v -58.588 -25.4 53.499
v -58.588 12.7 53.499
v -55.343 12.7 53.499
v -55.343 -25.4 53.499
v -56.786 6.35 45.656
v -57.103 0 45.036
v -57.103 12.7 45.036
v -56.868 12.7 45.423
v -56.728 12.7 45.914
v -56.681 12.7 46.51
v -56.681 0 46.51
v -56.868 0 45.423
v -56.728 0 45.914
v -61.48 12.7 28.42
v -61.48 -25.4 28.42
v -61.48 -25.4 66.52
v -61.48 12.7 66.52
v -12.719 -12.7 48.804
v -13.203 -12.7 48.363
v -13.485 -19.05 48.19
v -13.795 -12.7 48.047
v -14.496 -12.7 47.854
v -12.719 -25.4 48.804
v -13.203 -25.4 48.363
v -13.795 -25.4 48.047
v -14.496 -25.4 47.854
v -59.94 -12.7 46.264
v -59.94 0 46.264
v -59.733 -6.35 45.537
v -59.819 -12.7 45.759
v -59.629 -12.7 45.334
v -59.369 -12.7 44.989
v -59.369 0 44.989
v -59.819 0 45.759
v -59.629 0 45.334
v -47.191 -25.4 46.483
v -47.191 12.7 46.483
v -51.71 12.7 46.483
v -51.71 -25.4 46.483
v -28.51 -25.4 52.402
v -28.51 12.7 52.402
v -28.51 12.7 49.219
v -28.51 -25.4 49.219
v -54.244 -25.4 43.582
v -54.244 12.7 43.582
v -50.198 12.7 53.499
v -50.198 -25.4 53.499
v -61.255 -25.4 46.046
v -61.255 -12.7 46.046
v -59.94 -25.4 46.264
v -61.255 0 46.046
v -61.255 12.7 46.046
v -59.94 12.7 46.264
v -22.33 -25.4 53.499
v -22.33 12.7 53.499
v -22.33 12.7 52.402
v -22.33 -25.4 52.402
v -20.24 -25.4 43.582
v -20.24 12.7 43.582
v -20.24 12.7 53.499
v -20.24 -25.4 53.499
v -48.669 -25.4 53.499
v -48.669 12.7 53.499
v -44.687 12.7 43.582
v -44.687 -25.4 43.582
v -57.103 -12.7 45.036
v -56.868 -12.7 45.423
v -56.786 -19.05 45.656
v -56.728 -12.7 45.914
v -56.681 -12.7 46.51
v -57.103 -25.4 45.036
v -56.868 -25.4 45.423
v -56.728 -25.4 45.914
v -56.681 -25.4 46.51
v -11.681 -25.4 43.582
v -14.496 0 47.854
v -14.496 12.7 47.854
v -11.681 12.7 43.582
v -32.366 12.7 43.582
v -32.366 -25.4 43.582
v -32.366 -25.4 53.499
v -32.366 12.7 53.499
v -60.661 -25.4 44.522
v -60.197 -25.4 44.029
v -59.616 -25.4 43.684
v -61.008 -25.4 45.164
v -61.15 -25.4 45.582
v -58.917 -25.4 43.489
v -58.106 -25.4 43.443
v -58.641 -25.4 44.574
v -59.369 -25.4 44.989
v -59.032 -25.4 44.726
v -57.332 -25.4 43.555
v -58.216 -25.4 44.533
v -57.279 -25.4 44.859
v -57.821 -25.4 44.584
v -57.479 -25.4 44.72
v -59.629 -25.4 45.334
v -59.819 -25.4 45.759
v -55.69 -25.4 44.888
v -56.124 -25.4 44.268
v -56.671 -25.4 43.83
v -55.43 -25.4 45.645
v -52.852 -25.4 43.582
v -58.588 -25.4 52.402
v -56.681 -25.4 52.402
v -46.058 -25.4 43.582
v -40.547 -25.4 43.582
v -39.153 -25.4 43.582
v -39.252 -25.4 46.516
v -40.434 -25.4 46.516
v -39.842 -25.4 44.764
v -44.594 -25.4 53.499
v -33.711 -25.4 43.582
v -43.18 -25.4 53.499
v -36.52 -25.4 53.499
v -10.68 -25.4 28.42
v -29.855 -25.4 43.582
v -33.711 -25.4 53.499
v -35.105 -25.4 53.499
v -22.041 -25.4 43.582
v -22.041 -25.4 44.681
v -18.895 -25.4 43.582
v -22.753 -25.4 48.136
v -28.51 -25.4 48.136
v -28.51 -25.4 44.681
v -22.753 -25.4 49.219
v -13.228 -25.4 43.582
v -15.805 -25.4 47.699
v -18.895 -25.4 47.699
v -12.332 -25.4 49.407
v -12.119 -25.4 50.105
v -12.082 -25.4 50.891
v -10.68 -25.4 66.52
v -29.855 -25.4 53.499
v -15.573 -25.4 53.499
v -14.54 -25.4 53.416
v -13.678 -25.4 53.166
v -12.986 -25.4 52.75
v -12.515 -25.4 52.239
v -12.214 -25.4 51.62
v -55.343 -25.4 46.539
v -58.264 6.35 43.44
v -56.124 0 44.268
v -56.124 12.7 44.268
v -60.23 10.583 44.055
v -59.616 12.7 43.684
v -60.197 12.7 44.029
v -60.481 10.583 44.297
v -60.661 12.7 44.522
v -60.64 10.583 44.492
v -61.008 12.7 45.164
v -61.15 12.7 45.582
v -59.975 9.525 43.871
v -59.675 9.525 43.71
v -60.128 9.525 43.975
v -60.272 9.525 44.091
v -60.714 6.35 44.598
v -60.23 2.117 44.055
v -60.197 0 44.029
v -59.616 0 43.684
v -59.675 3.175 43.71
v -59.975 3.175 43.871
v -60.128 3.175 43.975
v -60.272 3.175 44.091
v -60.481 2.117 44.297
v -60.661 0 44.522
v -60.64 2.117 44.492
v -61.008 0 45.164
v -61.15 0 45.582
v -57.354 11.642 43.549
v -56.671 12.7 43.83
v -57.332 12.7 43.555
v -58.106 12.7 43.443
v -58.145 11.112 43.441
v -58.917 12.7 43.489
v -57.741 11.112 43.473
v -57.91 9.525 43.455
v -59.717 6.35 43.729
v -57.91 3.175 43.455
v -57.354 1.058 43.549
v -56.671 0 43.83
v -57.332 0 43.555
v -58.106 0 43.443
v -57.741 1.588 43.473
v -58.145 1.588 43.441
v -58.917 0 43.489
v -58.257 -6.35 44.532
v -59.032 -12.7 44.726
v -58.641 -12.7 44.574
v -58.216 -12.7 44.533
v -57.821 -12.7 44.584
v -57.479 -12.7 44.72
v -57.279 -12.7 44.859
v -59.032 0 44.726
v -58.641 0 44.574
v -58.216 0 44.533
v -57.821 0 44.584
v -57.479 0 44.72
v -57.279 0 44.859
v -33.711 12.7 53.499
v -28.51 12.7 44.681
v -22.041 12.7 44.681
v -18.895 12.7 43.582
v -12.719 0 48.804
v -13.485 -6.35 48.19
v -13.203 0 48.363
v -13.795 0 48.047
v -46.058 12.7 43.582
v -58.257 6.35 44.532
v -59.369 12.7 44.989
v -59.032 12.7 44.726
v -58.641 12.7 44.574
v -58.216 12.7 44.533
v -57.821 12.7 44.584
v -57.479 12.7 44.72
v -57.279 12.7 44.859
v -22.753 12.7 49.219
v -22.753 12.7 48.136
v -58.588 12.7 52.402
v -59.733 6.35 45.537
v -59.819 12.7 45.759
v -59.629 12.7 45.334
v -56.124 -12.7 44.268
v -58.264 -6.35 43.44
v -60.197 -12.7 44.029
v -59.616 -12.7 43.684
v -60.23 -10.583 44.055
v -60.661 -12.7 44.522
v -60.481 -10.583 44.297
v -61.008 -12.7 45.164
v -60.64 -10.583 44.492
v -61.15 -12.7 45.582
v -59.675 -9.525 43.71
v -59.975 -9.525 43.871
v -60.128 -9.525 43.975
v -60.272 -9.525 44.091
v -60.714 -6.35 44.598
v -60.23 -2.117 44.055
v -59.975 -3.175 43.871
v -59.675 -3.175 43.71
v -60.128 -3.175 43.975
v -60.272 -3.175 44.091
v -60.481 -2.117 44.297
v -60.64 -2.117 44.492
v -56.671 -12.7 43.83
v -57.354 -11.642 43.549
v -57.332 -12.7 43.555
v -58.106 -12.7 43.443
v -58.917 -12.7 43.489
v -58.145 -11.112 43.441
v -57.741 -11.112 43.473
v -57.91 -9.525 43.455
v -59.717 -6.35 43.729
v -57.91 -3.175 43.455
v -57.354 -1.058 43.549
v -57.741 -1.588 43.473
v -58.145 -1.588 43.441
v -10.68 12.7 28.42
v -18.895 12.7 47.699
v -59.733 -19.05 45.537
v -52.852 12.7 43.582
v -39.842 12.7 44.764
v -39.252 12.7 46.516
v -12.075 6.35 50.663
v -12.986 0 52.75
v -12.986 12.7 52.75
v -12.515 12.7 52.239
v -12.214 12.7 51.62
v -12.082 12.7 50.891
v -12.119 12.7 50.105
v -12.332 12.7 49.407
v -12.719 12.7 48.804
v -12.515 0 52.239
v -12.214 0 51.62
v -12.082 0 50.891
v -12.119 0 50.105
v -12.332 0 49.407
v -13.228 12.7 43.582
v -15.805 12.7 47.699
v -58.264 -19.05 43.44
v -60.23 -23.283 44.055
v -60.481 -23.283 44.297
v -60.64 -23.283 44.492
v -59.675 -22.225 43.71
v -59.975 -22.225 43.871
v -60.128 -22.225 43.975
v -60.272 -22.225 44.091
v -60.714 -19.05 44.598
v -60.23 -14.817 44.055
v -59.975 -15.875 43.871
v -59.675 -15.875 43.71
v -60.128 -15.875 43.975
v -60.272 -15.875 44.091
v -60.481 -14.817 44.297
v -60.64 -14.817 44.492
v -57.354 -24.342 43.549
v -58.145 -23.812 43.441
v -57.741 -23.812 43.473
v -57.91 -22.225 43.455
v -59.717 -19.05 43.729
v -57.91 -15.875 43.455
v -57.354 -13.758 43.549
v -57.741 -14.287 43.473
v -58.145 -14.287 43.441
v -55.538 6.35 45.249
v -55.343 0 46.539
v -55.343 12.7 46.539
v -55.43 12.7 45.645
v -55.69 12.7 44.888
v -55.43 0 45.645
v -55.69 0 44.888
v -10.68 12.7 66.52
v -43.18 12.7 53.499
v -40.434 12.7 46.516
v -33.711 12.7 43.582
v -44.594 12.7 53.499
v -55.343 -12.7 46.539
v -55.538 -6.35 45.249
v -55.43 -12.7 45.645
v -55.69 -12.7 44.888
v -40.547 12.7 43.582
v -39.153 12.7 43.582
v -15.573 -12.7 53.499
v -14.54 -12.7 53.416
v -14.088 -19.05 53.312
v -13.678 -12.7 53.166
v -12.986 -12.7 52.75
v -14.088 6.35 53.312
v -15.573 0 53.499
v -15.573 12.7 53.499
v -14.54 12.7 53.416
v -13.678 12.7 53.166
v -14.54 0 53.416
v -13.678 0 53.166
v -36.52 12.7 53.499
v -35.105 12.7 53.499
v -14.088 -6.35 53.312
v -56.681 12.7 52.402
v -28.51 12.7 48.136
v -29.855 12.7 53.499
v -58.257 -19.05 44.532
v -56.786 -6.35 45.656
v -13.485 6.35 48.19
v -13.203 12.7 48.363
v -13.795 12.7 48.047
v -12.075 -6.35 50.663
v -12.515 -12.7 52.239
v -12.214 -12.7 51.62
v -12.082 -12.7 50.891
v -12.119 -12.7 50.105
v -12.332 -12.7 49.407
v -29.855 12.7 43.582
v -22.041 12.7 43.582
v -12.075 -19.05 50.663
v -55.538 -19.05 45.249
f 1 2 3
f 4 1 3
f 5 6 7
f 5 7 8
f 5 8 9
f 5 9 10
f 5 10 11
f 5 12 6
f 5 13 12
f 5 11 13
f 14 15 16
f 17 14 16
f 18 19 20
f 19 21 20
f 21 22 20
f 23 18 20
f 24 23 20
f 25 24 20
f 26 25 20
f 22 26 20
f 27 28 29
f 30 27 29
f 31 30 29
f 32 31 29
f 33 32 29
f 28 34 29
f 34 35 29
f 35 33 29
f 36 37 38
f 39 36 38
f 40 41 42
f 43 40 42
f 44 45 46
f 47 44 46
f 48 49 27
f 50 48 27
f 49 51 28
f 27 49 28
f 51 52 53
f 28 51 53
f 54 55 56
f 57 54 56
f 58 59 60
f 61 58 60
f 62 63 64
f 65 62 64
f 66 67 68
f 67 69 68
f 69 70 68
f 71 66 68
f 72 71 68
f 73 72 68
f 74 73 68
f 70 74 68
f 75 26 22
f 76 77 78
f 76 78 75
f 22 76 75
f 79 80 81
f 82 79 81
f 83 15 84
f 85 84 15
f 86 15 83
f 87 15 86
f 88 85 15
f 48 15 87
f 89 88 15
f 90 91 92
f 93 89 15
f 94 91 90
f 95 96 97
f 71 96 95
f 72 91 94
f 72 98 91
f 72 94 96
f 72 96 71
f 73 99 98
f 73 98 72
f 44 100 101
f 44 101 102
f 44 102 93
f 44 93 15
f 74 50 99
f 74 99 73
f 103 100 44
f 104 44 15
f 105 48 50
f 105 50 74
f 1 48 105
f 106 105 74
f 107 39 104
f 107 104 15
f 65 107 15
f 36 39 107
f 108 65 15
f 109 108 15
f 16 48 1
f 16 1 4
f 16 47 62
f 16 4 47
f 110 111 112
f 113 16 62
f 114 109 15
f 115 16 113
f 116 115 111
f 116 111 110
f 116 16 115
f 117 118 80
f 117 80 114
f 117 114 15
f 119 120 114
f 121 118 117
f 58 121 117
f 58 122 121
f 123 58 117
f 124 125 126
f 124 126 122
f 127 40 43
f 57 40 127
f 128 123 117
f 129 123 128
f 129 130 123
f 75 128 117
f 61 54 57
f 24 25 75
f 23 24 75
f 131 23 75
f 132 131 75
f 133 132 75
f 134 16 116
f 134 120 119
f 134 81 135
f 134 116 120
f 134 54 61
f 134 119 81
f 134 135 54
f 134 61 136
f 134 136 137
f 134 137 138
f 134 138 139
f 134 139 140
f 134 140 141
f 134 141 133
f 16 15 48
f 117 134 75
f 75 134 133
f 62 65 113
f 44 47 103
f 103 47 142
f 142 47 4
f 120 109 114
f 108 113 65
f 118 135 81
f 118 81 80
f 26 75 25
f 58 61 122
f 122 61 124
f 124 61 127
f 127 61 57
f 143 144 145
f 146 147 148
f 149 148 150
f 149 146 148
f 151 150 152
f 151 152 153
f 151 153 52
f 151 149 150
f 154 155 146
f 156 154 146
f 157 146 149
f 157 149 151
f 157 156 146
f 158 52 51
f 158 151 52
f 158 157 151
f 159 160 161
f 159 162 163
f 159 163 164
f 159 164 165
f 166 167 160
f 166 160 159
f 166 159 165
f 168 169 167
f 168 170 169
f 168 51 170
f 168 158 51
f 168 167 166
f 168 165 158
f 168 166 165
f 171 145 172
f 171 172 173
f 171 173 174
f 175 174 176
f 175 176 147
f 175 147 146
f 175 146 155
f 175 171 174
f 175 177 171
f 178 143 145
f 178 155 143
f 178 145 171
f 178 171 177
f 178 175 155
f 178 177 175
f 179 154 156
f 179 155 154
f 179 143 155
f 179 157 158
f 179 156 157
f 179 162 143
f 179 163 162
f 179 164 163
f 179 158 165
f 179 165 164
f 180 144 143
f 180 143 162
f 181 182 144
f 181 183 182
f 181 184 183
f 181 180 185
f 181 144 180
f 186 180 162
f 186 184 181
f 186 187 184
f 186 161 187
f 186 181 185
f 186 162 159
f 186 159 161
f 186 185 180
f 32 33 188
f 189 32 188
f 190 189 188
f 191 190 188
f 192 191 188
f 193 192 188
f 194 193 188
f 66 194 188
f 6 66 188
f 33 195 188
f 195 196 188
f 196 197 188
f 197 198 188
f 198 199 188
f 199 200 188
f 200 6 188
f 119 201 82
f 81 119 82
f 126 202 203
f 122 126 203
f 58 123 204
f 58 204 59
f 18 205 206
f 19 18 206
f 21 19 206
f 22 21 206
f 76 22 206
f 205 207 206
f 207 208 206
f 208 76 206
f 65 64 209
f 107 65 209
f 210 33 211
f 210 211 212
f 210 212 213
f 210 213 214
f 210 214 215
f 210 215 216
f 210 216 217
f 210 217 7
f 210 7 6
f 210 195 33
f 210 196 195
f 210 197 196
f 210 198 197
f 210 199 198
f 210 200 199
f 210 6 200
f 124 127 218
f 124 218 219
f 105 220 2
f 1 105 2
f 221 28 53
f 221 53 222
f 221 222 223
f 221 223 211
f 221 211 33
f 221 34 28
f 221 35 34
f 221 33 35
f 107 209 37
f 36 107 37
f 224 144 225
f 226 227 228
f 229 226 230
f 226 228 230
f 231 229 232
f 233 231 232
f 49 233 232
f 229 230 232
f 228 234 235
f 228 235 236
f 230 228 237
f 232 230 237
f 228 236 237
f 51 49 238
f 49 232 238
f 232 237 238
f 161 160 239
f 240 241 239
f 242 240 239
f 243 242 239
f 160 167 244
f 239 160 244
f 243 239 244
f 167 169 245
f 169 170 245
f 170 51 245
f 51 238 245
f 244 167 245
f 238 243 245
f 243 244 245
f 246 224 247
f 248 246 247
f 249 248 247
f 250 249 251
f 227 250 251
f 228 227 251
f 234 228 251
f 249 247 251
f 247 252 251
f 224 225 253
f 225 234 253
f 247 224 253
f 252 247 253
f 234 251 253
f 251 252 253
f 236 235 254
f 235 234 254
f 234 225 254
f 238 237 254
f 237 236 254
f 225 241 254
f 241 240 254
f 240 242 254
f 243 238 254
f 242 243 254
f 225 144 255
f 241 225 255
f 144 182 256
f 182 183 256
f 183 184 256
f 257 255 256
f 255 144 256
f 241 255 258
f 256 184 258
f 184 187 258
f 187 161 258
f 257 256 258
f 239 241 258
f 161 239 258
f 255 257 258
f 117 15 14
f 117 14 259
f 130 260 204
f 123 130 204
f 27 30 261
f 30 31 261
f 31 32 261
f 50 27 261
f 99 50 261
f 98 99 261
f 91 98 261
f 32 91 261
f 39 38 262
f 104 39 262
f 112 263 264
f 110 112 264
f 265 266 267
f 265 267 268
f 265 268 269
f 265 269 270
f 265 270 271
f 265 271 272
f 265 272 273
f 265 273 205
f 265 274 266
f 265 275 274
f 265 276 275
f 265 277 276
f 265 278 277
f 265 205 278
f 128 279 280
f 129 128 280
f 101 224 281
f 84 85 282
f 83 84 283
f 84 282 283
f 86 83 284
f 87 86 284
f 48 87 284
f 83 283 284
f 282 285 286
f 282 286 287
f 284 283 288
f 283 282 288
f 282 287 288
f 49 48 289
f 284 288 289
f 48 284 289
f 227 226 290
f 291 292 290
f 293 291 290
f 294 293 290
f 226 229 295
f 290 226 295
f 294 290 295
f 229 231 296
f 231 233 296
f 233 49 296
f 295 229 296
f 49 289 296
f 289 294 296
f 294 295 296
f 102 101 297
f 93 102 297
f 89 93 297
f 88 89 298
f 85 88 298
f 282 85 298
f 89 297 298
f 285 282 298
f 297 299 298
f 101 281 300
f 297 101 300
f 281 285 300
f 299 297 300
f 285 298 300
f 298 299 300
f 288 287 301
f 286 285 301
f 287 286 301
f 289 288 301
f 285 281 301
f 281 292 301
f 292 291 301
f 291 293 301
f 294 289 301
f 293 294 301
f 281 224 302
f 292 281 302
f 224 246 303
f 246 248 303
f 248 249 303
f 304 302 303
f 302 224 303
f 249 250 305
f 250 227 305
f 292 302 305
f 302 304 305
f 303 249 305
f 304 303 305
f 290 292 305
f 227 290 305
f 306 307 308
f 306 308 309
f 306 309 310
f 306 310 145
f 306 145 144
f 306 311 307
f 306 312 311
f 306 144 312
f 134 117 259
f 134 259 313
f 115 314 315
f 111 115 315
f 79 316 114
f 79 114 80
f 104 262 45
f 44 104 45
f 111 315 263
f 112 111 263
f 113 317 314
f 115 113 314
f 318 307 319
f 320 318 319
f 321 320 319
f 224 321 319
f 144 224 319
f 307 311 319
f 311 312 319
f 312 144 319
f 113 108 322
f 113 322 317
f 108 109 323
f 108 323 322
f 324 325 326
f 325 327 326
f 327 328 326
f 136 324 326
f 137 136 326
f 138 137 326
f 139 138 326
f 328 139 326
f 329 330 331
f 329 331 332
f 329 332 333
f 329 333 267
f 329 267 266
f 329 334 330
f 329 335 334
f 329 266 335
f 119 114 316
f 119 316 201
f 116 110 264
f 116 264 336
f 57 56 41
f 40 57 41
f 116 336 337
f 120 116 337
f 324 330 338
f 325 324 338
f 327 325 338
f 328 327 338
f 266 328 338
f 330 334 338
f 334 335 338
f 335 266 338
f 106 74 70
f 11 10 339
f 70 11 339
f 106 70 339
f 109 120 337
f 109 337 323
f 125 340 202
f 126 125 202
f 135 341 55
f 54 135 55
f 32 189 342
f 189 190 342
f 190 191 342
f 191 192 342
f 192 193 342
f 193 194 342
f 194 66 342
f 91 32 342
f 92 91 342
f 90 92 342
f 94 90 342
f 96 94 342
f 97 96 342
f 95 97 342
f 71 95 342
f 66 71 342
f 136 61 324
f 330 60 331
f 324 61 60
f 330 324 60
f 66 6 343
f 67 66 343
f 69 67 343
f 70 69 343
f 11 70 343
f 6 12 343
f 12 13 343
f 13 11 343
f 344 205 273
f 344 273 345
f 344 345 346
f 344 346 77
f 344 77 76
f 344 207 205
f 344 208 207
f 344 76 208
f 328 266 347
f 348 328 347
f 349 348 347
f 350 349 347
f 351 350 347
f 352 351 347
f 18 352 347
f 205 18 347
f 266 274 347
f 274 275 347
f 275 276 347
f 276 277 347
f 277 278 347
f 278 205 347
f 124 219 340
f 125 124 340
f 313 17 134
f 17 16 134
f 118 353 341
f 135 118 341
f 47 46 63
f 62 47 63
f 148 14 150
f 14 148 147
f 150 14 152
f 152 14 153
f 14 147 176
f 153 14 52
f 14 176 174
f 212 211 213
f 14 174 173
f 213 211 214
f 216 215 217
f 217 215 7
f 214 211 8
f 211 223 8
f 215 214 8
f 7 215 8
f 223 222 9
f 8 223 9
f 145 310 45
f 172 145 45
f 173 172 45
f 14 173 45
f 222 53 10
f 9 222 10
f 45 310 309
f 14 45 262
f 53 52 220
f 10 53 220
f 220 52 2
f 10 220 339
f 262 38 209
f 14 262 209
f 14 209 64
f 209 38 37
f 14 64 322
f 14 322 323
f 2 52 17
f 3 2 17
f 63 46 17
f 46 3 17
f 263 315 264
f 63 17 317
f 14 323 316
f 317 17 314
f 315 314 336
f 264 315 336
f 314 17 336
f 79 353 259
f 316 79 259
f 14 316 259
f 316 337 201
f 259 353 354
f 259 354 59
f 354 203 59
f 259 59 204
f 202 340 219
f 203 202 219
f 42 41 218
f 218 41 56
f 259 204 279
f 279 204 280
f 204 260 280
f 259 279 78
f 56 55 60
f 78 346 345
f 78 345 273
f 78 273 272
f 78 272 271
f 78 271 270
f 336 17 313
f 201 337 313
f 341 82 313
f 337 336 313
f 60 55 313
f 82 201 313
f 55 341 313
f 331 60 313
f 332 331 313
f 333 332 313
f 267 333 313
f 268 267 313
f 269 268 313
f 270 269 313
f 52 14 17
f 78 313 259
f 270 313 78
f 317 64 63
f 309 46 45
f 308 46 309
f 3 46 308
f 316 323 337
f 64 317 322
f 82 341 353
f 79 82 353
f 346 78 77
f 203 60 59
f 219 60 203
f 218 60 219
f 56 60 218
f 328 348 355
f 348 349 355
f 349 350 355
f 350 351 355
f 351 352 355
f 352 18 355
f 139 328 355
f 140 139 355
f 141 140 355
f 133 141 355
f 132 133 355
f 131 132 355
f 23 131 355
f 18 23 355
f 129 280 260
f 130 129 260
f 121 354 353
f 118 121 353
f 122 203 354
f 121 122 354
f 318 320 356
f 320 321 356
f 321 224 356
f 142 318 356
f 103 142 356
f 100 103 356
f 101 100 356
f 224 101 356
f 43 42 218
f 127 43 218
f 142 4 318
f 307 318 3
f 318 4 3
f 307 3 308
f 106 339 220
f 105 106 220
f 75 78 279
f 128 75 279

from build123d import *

# Parameters (mm, degrees)
F0_W     = 50.8
F0_H     = 38.1
F0_W_2   = 1.3446661346
F0_H_2   = 9.9171942893
F1_DEPTH = 12.7
F2_DEPTH = 25.4


with BuildPart() as f1:
    # F0 (on Front) → F1 (new body, symmetric)
    with BuildSketch(Plane.XZ):
        with Locations((-36.0804582015, 47.4701705396)):
            Rectangle(F0_W, F0_H)
        with BuildLine():
            add(Edge.make_bspline(
                [(-56.1243173839, 44.267506293), (-56.9058904973, 43.4397595518), (-58.2640708644, 43.4397595518)],
                knots=[0, 0, 0, 1, 1, 1], degree=2))
            add(Edge.make_bspline(
                [(-58.2640708644, 43.4397595518), (-60.7844752273, 43.4397595518), (-61.255220993, 46.0457540539)],
                knots=[0, 0, 0, 1, 1, 1], degree=2))
            Line((-61.255220993, 46.0457540539), (-59.9398356955, 46.2642341461))
            add(Edge.make_bspline(
                [(-59.9398356955, 46.2642341461), (-59.8114504867, 45.4466230794), (-59.368859372, 44.9893915462)],
                knots=[0, 0, 0, 1, 1, 1], degree=2))
            add(Edge.make_bspline(
                [(-59.368859372, 44.9893915462), (-58.9262682573, 44.5321600129), (-58.2573137482, 44.5321600129)],
                knots=[0, 0, 0, 1, 1, 1], degree=2))
            add(Edge.make_bspline(
                [(-58.2573137482, 44.5321600129), (-57.5252928206, 44.5321600129), (-57.1029730547, 45.0355651739)],
                knots=[0, 0, 0, 1, 1, 1], degree=2))
            add(Edge.make_bspline(
                [(-57.1029730547, 45.0355651739), (-56.6806532888, 45.5389703348), (-56.6806532888, 46.5097427034)],
                knots=[0, 0, 0, 1, 1, 1], degree=2))
            Line((-56.6806532888, 46.5097427034), (-56.6806532888, 52.4019480771))
            Line((-56.6806532888, 52.4019480771), (-58.5884124446, 52.4019480771))
            Line((-58.5884124446, 52.4019480771), (-58.5884124446, 53.4988532824))
            Line((-58.5884124446, 53.4988532824), (-55.3427442705, 53.4988532824))
            Line((-55.3427442705, 53.4988532824), (-55.3427442705, 46.5390235405))
            add(Edge.make_bspline(
                [(-55.3427442705, 46.5390235405), (-55.3427442705, 45.0952530341), (-56.1243173839, 44.267506293)],
                knots=[0, 0, 0, 1, 1, 1], degree=2))
        make_face(mode=Mode.SUBTRACT)
        Polygon((-44.6867719374, 43.5816589932), (-46.058466537, 43.5816589932), (-47.1914096957, 46.4827142384), (-51.7096680977, 46.4827142384), (-52.8516207447, 43.5816589932), (-54.2435866931, 43.5816589932), (-50.1983264288, 53.4988532824), (-48.6689657833, 53.4988532824), align=None, mode=Mode.SUBTRACT)
        Polygon((-35.1051810888, 53.4988532824), (-39.1526937251, 43.5816589932), (-40.5469120456, 43.5816589932), (-44.5944246819, 53.4988532824), (-43.1799350127, 53.4988532824), (-40.4342934413, 46.5164998196), (-39.841919583, 44.7641543377), (-39.2517980968, 46.5164998196), (-36.519670758, 53.4988532824), align=None, mode=Mode.SUBTRACT)
        with Locations((-33.038629701, 48.5402561378)):
            Rectangle(F0_W_2, F0_H_2, mode=Mode.SUBTRACT)
        Polygon((-22.0414229971, 43.5816589932), (-29.8549017592, 43.5816589932), (-29.8549017592, 53.4988532824), (-22.3297266239, 53.4988532824), (-22.3297266239, 52.4019480771), (-28.5102356245, 52.4019480771), (-28.5102356245, 49.2193463214), (-22.7531725759, 49.2193463214), (-22.7531725759, 48.1359553486), (-28.5102356245, 48.1359553486), (-28.5102356245, 44.6808165705), (-22.0414229971, 44.6808165705), align=None, mode=Mode.SUBTRACT)
        with BuildLine():
            Line((-11.6805114071, 43.5816589932), (-13.2278910293, 43.5816589932))
            Line((-13.2278910293, 43.5816589932), (-15.8046046943, 47.6989951641))
            Line((-15.8046046943, 47.6989951641), (-18.8948591946, 47.6989951641))
            Line((-18.8948591946, 47.6989951641), (-18.8948591946, 43.5816589932))
            Line((-18.8948591946, 43.5816589932), (-20.2395253293, 43.5816589932))
            Line((-20.2395253293, 43.5816589932), (-20.2395253293, 53.4988532824))
            Line((-20.2395253293, 53.4988532824), (-15.5726103696, 53.4988532824))
            add(Edge.make_bspline(
                [(-15.5726103696, 53.4988532824), (-13.8968455385, 53.4988532824), (-12.9857610302, 52.7499395642)],
                knots=[0, 0, 0, 1, 1, 1], degree=2))
            add(Edge.make_bspline(
                [(-12.9857610302, 52.7499395642), (-12.0746765219, 52.0010258461), (-12.0746765219, 50.6631168277)],
                knots=[0, 0, 0, 1, 1, 1], degree=2))
            add(Edge.make_bspline(
                [(-12.0746765219, 50.6631168277), (-12.0746765219, 49.5572021341), (-12.7188549382, 48.8037836717)],
                knots=[0, 0, 0, 1, 1, 1], degree=2))
            add(Edge.make_bspline(
                [(-12.7188549382, 48.8037836717), (-13.3630333544, 48.0503652094), (-14.4959765131, 47.854408838)],
                knots=[0, 0, 0, 1, 1, 1], degree=2))
            Line((-14.4959765131, 47.854408838), (-11.6805114071, 43.5816589932))
        make_face(mode=Mode.SUBTRACT)
    extrude(amount=F1_DEPTH, both=True)

    # F0 (on Front) → F2 (join)
    with BuildSketch(Plane.XZ):
        with Locations((-36.0804582015, 47.4701705396)):
            Rectangle(F0_W, F0_H)
        with BuildLine():
            add(Edge.make_bspline(
                [(-56.1243173839, 44.267506293), (-56.9058904973, 43.4397595518), (-58.2640708644, 43.4397595518)],
                knots=[0, 0, 0, 1, 1, 1], degree=2))
            add(Edge.make_bspline(
                [(-58.2640708644, 43.4397595518), (-60.7844752273, 43.4397595518), (-61.255220993, 46.0457540539)],
                knots=[0, 0, 0, 1, 1, 1], degree=2))
            Line((-61.255220993, 46.0457540539), (-59.9398356955, 46.2642341461))
            add(Edge.make_bspline(
                [(-59.9398356955, 46.2642341461), (-59.8114504867, 45.4466230794), (-59.368859372, 44.9893915462)],
                knots=[0, 0, 0, 1, 1, 1], degree=2))
            add(Edge.make_bspline(
                [(-59.368859372, 44.9893915462), (-58.9262682573, 44.5321600129), (-58.2573137482, 44.5321600129)],
                knots=[0, 0, 0, 1, 1, 1], degree=2))
            add(Edge.make_bspline(
                [(-58.2573137482, 44.5321600129), (-57.5252928206, 44.5321600129), (-57.1029730547, 45.0355651739)],
                knots=[0, 0, 0, 1, 1, 1], degree=2))
            add(Edge.make_bspline(
                [(-57.1029730547, 45.0355651739), (-56.6806532888, 45.5389703348), (-56.6806532888, 46.5097427034)],
                knots=[0, 0, 0, 1, 1, 1], degree=2))
            Line((-56.6806532888, 46.5097427034), (-56.6806532888, 52.4019480771))
            Line((-56.6806532888, 52.4019480771), (-58.5884124446, 52.4019480771))
            Line((-58.5884124446, 52.4019480771), (-58.5884124446, 53.4988532824))
            Line((-58.5884124446, 53.4988532824), (-55.3427442705, 53.4988532824))
            Line((-55.3427442705, 53.4988532824), (-55.3427442705, 46.5390235405))
            add(Edge.make_bspline(
                [(-55.3427442705, 46.5390235405), (-55.3427442705, 45.0952530341), (-56.1243173839, 44.267506293)],
                knots=[0, 0, 0, 1, 1, 1], degree=2))
        make_face(mode=Mode.SUBTRACT)
        Polygon((-44.6867719374, 43.5816589932), (-46.058466537, 43.5816589932), (-47.1914096957, 46.4827142384), (-51.7096680977, 46.4827142384), (-52.8516207447, 43.5816589932), (-54.2435866931, 43.5816589932), (-50.1983264288, 53.4988532824), (-48.6689657833, 53.4988532824), align=None, mode=Mode.SUBTRACT)
        Polygon((-35.1051810888, 53.4988532824), (-39.1526937251, 43.5816589932), (-40.5469120456, 43.5816589932), (-44.5944246819, 53.4988532824), (-43.1799350127, 53.4988532824), (-40.4342934413, 46.5164998196), (-39.841919583, 44.7641543377), (-39.2517980968, 46.5164998196), (-36.519670758, 53.4988532824), align=None, mode=Mode.SUBTRACT)
        with Locations((-33.038629701, 48.5402561378)):
            Rectangle(F0_W_2, F0_H_2, mode=Mode.SUBTRACT)
        Polygon((-22.0414229971, 43.5816589932), (-29.8549017592, 43.5816589932), (-29.8549017592, 53.4988532824), (-22.3297266239, 53.4988532824), (-22.3297266239, 52.4019480771), (-28.5102356245, 52.4019480771), (-28.5102356245, 49.2193463214), (-22.7531725759, 49.2193463214), (-22.7531725759, 48.1359553486), (-28.5102356245, 48.1359553486), (-28.5102356245, 44.6808165705), (-22.0414229971, 44.6808165705), align=None, mode=Mode.SUBTRACT)
        with BuildLine():
            Line((-11.6805114071, 43.5816589932), (-13.2278910293, 43.5816589932))
            Line((-13.2278910293, 43.5816589932), (-15.8046046943, 47.6989951641))
            Line((-15.8046046943, 47.6989951641), (-18.8948591946, 47.6989951641))
            Line((-18.8948591946, 47.6989951641), (-18.8948591946, 43.5816589932))
            Line((-18.8948591946, 43.5816589932), (-20.2395253293, 43.5816589932))
            Line((-20.2395253293, 43.5816589932), (-20.2395253293, 53.4988532824))
            Line((-20.2395253293, 53.4988532824), (-15.5726103696, 53.4988532824))
            add(Edge.make_bspline(
                [(-15.5726103696, 53.4988532824), (-13.8968455385, 53.4988532824), (-12.9857610302, 52.7499395642)],
                knots=[0, 0, 0, 1, 1, 1], degree=2))
            add(Edge.make_bspline(
                [(-12.9857610302, 52.7499395642), (-12.0746765219, 52.0010258461), (-12.0746765219, 50.6631168277)],
                knots=[0, 0, 0, 1, 1, 1], degree=2))
            add(Edge.make_bspline(
                [(-12.0746765219, 50.6631168277), (-12.0746765219, 49.5572021341), (-12.7188549382, 48.8037836717)],
                knots=[0, 0, 0, 1, 1, 1], degree=2))
            add(Edge.make_bspline(
                [(-12.7188549382, 48.8037836717), (-13.3630333544, 48.0503652094), (-14.4959765131, 47.854408838)],
                knots=[0, 0, 0, 1, 1, 1], degree=2))
            Line((-14.4959765131, 47.854408838), (-11.6805114071, 43.5816589932))
        make_face(mode=Mode.SUBTRACT)
    extrude(amount=F2_DEPTH)


solid = f1.part
